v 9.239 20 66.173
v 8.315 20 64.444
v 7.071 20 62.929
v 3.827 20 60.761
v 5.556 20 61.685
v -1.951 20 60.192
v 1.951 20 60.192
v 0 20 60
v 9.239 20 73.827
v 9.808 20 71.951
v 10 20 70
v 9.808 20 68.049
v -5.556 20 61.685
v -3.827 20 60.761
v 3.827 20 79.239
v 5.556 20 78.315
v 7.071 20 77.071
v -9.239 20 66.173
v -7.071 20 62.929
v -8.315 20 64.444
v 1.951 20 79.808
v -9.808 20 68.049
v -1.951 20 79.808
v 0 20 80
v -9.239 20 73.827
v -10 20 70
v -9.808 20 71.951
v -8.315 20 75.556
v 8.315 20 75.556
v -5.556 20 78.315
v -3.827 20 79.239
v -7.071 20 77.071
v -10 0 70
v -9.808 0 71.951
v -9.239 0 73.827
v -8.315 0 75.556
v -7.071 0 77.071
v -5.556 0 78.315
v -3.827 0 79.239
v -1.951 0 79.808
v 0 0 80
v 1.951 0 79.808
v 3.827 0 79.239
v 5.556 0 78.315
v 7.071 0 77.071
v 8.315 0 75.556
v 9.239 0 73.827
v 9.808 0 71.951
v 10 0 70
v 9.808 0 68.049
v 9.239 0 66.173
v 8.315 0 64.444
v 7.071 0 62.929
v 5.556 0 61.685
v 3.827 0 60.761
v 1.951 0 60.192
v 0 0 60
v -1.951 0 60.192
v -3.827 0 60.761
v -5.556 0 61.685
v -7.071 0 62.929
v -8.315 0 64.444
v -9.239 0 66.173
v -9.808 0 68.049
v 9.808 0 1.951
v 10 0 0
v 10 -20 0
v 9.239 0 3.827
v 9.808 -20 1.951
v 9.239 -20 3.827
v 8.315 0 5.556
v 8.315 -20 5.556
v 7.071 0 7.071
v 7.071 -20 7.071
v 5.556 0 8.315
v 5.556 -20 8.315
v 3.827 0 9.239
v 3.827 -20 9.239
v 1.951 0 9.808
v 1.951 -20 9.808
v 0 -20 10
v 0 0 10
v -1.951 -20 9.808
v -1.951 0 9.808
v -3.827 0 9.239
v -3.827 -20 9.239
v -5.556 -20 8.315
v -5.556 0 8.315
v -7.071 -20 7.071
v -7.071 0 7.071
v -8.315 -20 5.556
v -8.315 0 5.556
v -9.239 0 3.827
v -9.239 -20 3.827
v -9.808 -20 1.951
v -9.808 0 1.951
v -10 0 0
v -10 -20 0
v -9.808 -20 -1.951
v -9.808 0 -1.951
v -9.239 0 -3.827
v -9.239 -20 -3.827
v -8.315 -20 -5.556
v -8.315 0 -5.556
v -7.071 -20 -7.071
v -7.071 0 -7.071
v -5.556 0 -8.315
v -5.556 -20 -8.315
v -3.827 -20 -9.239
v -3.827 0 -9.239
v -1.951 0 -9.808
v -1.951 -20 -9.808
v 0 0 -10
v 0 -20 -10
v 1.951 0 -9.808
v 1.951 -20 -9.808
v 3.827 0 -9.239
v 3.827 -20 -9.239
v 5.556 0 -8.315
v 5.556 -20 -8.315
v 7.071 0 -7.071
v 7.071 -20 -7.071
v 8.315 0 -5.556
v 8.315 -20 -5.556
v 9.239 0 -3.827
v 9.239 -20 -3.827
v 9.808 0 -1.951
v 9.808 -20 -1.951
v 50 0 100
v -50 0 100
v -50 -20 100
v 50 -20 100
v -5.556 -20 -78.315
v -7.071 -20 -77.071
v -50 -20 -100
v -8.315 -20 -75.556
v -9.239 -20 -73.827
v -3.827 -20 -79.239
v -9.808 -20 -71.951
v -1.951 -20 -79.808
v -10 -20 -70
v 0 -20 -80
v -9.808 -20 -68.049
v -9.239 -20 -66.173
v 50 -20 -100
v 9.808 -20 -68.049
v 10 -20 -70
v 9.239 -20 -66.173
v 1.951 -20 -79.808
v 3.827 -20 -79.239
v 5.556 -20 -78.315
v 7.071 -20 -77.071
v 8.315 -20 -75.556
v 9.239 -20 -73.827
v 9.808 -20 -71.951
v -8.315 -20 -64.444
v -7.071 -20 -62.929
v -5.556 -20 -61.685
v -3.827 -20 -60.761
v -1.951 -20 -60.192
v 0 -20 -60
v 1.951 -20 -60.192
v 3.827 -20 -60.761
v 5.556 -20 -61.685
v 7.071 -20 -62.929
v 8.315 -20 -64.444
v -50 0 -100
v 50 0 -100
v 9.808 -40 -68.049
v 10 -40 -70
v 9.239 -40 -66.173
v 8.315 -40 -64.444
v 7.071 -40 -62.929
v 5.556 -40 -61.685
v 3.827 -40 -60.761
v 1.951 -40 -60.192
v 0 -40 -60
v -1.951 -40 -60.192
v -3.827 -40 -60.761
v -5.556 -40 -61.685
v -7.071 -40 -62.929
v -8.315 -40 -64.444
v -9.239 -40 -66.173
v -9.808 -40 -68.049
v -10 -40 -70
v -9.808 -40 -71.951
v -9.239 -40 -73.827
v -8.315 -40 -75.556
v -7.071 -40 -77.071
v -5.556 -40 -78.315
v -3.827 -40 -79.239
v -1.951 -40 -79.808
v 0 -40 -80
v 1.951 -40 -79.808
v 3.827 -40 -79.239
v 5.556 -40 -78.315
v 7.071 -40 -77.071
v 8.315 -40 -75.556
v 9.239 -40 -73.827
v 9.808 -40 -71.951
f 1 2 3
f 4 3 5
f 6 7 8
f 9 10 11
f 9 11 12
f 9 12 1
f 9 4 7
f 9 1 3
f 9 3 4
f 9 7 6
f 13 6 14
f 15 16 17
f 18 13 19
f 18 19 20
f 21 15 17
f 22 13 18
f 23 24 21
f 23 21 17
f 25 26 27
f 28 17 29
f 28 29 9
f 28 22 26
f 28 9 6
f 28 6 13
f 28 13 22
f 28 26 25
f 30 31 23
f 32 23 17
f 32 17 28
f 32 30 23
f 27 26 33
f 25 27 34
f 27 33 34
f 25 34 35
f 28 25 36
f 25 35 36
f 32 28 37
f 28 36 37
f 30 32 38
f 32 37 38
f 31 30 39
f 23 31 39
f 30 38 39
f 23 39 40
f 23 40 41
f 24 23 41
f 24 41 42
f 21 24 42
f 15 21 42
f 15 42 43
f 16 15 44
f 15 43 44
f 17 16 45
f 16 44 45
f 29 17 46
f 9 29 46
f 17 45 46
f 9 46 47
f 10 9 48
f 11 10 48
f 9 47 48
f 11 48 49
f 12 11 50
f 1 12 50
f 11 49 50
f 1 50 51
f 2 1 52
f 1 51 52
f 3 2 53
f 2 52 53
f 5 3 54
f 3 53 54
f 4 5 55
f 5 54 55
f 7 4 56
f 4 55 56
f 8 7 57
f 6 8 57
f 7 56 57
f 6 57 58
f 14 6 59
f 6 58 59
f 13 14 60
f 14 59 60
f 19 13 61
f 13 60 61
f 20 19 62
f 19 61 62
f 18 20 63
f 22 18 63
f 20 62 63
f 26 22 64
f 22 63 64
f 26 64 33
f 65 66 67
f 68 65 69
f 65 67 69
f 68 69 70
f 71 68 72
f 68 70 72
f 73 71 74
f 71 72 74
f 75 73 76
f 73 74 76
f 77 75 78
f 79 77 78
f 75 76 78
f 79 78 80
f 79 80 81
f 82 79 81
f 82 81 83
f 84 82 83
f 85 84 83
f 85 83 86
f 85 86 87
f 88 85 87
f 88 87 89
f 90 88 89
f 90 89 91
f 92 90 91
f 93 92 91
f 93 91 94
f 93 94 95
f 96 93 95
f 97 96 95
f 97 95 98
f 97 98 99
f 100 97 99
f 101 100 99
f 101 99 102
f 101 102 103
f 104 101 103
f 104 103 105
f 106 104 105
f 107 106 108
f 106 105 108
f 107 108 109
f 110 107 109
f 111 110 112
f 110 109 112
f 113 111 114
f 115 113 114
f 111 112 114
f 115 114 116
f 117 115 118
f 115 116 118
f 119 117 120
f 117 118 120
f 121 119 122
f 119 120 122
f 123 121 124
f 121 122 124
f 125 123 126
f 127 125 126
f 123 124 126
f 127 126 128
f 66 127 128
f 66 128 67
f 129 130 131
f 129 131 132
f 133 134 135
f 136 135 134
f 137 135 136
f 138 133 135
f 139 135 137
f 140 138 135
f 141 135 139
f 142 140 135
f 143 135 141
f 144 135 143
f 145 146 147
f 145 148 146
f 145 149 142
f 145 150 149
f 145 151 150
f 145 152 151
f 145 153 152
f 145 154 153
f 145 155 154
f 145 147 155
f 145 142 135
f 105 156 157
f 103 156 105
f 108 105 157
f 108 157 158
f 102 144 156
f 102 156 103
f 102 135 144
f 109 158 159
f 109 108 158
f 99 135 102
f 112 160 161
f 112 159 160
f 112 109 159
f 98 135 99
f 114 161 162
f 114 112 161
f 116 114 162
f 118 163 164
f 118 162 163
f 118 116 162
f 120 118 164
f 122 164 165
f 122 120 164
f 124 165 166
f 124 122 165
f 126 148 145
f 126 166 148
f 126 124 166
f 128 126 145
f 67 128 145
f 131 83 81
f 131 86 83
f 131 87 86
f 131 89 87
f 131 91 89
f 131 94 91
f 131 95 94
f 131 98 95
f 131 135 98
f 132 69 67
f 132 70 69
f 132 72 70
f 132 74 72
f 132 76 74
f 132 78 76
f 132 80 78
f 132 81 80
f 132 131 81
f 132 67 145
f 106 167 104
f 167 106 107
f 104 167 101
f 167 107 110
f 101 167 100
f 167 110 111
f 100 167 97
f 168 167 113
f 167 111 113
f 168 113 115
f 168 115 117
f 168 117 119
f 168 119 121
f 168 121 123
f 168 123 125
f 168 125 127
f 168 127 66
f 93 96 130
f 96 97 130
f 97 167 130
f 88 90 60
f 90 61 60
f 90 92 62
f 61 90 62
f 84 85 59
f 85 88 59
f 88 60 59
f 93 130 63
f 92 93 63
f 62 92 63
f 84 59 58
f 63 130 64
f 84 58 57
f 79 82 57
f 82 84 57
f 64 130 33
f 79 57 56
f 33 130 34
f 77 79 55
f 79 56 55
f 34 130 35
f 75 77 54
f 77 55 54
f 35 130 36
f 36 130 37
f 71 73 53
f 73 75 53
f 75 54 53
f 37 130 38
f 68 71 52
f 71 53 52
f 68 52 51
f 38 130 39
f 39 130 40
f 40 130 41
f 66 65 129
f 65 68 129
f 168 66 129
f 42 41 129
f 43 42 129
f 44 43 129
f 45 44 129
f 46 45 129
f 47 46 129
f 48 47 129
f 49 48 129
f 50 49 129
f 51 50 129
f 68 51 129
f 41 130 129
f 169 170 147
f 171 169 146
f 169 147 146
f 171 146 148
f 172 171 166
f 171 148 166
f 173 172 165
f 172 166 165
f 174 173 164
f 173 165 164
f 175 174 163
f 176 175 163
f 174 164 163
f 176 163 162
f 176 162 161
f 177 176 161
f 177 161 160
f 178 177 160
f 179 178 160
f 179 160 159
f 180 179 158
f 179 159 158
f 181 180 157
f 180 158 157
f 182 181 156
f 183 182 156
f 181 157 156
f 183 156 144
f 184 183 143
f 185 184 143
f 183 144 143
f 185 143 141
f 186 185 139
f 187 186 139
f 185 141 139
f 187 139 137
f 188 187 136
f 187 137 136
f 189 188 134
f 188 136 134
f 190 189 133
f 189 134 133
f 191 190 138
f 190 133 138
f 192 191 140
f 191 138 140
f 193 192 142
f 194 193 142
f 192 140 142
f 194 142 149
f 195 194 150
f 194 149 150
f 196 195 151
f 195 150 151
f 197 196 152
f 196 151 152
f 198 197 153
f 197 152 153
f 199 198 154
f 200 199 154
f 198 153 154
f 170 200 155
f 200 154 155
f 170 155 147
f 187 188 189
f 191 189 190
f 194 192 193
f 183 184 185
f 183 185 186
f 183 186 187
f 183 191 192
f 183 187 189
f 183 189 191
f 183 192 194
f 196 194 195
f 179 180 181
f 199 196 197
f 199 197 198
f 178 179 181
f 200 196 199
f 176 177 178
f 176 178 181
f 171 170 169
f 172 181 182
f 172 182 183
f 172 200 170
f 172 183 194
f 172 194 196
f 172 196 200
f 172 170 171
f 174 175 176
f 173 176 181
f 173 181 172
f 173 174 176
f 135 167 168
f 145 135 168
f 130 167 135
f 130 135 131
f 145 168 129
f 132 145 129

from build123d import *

# Parameters (mm, degrees)
F0_W     = 100
F0_H     = 200
F1_DEPTH = 20
F2_R     = 10
F3_DEPTH = 20.001
F4_R     = 10
F5_DEPTH = 20
F6_R     = 10
F7_DEPTH = 20


with BuildPart() as f1:
    # F0 (on Front) → F1 (new body)
    with BuildSketch(Plane.XZ):
        Rectangle(F0_W, F0_H)
    extrude(amount=F1_DEPTH)

    # F2 (on face) → F3 (cut, through all)
    with BuildSketch(Plane.XZ.offset(20)):
        Circle(F2_R)
    extrude(amount=-F3_DEPTH, mode=Mode.SUBTRACT)

    # F4 (on face) → F5 (join)
    with BuildSketch(Plane.XZ.offset(20)):
        with Locations((0, -70)):
            Circle(F4_R)
    extrude(amount=F5_DEPTH)

    # F6 (on face) → F7 (join)
    with BuildSketch(Plane(origin=(0, 0, 0), x_dir=(-1, 0, 0), z_dir=(0, 1, 0))):
        with Locations((0, 70)):
            Circle(F6_R)
    extrude(amount=F7_DEPTH)


solid = f1.part
